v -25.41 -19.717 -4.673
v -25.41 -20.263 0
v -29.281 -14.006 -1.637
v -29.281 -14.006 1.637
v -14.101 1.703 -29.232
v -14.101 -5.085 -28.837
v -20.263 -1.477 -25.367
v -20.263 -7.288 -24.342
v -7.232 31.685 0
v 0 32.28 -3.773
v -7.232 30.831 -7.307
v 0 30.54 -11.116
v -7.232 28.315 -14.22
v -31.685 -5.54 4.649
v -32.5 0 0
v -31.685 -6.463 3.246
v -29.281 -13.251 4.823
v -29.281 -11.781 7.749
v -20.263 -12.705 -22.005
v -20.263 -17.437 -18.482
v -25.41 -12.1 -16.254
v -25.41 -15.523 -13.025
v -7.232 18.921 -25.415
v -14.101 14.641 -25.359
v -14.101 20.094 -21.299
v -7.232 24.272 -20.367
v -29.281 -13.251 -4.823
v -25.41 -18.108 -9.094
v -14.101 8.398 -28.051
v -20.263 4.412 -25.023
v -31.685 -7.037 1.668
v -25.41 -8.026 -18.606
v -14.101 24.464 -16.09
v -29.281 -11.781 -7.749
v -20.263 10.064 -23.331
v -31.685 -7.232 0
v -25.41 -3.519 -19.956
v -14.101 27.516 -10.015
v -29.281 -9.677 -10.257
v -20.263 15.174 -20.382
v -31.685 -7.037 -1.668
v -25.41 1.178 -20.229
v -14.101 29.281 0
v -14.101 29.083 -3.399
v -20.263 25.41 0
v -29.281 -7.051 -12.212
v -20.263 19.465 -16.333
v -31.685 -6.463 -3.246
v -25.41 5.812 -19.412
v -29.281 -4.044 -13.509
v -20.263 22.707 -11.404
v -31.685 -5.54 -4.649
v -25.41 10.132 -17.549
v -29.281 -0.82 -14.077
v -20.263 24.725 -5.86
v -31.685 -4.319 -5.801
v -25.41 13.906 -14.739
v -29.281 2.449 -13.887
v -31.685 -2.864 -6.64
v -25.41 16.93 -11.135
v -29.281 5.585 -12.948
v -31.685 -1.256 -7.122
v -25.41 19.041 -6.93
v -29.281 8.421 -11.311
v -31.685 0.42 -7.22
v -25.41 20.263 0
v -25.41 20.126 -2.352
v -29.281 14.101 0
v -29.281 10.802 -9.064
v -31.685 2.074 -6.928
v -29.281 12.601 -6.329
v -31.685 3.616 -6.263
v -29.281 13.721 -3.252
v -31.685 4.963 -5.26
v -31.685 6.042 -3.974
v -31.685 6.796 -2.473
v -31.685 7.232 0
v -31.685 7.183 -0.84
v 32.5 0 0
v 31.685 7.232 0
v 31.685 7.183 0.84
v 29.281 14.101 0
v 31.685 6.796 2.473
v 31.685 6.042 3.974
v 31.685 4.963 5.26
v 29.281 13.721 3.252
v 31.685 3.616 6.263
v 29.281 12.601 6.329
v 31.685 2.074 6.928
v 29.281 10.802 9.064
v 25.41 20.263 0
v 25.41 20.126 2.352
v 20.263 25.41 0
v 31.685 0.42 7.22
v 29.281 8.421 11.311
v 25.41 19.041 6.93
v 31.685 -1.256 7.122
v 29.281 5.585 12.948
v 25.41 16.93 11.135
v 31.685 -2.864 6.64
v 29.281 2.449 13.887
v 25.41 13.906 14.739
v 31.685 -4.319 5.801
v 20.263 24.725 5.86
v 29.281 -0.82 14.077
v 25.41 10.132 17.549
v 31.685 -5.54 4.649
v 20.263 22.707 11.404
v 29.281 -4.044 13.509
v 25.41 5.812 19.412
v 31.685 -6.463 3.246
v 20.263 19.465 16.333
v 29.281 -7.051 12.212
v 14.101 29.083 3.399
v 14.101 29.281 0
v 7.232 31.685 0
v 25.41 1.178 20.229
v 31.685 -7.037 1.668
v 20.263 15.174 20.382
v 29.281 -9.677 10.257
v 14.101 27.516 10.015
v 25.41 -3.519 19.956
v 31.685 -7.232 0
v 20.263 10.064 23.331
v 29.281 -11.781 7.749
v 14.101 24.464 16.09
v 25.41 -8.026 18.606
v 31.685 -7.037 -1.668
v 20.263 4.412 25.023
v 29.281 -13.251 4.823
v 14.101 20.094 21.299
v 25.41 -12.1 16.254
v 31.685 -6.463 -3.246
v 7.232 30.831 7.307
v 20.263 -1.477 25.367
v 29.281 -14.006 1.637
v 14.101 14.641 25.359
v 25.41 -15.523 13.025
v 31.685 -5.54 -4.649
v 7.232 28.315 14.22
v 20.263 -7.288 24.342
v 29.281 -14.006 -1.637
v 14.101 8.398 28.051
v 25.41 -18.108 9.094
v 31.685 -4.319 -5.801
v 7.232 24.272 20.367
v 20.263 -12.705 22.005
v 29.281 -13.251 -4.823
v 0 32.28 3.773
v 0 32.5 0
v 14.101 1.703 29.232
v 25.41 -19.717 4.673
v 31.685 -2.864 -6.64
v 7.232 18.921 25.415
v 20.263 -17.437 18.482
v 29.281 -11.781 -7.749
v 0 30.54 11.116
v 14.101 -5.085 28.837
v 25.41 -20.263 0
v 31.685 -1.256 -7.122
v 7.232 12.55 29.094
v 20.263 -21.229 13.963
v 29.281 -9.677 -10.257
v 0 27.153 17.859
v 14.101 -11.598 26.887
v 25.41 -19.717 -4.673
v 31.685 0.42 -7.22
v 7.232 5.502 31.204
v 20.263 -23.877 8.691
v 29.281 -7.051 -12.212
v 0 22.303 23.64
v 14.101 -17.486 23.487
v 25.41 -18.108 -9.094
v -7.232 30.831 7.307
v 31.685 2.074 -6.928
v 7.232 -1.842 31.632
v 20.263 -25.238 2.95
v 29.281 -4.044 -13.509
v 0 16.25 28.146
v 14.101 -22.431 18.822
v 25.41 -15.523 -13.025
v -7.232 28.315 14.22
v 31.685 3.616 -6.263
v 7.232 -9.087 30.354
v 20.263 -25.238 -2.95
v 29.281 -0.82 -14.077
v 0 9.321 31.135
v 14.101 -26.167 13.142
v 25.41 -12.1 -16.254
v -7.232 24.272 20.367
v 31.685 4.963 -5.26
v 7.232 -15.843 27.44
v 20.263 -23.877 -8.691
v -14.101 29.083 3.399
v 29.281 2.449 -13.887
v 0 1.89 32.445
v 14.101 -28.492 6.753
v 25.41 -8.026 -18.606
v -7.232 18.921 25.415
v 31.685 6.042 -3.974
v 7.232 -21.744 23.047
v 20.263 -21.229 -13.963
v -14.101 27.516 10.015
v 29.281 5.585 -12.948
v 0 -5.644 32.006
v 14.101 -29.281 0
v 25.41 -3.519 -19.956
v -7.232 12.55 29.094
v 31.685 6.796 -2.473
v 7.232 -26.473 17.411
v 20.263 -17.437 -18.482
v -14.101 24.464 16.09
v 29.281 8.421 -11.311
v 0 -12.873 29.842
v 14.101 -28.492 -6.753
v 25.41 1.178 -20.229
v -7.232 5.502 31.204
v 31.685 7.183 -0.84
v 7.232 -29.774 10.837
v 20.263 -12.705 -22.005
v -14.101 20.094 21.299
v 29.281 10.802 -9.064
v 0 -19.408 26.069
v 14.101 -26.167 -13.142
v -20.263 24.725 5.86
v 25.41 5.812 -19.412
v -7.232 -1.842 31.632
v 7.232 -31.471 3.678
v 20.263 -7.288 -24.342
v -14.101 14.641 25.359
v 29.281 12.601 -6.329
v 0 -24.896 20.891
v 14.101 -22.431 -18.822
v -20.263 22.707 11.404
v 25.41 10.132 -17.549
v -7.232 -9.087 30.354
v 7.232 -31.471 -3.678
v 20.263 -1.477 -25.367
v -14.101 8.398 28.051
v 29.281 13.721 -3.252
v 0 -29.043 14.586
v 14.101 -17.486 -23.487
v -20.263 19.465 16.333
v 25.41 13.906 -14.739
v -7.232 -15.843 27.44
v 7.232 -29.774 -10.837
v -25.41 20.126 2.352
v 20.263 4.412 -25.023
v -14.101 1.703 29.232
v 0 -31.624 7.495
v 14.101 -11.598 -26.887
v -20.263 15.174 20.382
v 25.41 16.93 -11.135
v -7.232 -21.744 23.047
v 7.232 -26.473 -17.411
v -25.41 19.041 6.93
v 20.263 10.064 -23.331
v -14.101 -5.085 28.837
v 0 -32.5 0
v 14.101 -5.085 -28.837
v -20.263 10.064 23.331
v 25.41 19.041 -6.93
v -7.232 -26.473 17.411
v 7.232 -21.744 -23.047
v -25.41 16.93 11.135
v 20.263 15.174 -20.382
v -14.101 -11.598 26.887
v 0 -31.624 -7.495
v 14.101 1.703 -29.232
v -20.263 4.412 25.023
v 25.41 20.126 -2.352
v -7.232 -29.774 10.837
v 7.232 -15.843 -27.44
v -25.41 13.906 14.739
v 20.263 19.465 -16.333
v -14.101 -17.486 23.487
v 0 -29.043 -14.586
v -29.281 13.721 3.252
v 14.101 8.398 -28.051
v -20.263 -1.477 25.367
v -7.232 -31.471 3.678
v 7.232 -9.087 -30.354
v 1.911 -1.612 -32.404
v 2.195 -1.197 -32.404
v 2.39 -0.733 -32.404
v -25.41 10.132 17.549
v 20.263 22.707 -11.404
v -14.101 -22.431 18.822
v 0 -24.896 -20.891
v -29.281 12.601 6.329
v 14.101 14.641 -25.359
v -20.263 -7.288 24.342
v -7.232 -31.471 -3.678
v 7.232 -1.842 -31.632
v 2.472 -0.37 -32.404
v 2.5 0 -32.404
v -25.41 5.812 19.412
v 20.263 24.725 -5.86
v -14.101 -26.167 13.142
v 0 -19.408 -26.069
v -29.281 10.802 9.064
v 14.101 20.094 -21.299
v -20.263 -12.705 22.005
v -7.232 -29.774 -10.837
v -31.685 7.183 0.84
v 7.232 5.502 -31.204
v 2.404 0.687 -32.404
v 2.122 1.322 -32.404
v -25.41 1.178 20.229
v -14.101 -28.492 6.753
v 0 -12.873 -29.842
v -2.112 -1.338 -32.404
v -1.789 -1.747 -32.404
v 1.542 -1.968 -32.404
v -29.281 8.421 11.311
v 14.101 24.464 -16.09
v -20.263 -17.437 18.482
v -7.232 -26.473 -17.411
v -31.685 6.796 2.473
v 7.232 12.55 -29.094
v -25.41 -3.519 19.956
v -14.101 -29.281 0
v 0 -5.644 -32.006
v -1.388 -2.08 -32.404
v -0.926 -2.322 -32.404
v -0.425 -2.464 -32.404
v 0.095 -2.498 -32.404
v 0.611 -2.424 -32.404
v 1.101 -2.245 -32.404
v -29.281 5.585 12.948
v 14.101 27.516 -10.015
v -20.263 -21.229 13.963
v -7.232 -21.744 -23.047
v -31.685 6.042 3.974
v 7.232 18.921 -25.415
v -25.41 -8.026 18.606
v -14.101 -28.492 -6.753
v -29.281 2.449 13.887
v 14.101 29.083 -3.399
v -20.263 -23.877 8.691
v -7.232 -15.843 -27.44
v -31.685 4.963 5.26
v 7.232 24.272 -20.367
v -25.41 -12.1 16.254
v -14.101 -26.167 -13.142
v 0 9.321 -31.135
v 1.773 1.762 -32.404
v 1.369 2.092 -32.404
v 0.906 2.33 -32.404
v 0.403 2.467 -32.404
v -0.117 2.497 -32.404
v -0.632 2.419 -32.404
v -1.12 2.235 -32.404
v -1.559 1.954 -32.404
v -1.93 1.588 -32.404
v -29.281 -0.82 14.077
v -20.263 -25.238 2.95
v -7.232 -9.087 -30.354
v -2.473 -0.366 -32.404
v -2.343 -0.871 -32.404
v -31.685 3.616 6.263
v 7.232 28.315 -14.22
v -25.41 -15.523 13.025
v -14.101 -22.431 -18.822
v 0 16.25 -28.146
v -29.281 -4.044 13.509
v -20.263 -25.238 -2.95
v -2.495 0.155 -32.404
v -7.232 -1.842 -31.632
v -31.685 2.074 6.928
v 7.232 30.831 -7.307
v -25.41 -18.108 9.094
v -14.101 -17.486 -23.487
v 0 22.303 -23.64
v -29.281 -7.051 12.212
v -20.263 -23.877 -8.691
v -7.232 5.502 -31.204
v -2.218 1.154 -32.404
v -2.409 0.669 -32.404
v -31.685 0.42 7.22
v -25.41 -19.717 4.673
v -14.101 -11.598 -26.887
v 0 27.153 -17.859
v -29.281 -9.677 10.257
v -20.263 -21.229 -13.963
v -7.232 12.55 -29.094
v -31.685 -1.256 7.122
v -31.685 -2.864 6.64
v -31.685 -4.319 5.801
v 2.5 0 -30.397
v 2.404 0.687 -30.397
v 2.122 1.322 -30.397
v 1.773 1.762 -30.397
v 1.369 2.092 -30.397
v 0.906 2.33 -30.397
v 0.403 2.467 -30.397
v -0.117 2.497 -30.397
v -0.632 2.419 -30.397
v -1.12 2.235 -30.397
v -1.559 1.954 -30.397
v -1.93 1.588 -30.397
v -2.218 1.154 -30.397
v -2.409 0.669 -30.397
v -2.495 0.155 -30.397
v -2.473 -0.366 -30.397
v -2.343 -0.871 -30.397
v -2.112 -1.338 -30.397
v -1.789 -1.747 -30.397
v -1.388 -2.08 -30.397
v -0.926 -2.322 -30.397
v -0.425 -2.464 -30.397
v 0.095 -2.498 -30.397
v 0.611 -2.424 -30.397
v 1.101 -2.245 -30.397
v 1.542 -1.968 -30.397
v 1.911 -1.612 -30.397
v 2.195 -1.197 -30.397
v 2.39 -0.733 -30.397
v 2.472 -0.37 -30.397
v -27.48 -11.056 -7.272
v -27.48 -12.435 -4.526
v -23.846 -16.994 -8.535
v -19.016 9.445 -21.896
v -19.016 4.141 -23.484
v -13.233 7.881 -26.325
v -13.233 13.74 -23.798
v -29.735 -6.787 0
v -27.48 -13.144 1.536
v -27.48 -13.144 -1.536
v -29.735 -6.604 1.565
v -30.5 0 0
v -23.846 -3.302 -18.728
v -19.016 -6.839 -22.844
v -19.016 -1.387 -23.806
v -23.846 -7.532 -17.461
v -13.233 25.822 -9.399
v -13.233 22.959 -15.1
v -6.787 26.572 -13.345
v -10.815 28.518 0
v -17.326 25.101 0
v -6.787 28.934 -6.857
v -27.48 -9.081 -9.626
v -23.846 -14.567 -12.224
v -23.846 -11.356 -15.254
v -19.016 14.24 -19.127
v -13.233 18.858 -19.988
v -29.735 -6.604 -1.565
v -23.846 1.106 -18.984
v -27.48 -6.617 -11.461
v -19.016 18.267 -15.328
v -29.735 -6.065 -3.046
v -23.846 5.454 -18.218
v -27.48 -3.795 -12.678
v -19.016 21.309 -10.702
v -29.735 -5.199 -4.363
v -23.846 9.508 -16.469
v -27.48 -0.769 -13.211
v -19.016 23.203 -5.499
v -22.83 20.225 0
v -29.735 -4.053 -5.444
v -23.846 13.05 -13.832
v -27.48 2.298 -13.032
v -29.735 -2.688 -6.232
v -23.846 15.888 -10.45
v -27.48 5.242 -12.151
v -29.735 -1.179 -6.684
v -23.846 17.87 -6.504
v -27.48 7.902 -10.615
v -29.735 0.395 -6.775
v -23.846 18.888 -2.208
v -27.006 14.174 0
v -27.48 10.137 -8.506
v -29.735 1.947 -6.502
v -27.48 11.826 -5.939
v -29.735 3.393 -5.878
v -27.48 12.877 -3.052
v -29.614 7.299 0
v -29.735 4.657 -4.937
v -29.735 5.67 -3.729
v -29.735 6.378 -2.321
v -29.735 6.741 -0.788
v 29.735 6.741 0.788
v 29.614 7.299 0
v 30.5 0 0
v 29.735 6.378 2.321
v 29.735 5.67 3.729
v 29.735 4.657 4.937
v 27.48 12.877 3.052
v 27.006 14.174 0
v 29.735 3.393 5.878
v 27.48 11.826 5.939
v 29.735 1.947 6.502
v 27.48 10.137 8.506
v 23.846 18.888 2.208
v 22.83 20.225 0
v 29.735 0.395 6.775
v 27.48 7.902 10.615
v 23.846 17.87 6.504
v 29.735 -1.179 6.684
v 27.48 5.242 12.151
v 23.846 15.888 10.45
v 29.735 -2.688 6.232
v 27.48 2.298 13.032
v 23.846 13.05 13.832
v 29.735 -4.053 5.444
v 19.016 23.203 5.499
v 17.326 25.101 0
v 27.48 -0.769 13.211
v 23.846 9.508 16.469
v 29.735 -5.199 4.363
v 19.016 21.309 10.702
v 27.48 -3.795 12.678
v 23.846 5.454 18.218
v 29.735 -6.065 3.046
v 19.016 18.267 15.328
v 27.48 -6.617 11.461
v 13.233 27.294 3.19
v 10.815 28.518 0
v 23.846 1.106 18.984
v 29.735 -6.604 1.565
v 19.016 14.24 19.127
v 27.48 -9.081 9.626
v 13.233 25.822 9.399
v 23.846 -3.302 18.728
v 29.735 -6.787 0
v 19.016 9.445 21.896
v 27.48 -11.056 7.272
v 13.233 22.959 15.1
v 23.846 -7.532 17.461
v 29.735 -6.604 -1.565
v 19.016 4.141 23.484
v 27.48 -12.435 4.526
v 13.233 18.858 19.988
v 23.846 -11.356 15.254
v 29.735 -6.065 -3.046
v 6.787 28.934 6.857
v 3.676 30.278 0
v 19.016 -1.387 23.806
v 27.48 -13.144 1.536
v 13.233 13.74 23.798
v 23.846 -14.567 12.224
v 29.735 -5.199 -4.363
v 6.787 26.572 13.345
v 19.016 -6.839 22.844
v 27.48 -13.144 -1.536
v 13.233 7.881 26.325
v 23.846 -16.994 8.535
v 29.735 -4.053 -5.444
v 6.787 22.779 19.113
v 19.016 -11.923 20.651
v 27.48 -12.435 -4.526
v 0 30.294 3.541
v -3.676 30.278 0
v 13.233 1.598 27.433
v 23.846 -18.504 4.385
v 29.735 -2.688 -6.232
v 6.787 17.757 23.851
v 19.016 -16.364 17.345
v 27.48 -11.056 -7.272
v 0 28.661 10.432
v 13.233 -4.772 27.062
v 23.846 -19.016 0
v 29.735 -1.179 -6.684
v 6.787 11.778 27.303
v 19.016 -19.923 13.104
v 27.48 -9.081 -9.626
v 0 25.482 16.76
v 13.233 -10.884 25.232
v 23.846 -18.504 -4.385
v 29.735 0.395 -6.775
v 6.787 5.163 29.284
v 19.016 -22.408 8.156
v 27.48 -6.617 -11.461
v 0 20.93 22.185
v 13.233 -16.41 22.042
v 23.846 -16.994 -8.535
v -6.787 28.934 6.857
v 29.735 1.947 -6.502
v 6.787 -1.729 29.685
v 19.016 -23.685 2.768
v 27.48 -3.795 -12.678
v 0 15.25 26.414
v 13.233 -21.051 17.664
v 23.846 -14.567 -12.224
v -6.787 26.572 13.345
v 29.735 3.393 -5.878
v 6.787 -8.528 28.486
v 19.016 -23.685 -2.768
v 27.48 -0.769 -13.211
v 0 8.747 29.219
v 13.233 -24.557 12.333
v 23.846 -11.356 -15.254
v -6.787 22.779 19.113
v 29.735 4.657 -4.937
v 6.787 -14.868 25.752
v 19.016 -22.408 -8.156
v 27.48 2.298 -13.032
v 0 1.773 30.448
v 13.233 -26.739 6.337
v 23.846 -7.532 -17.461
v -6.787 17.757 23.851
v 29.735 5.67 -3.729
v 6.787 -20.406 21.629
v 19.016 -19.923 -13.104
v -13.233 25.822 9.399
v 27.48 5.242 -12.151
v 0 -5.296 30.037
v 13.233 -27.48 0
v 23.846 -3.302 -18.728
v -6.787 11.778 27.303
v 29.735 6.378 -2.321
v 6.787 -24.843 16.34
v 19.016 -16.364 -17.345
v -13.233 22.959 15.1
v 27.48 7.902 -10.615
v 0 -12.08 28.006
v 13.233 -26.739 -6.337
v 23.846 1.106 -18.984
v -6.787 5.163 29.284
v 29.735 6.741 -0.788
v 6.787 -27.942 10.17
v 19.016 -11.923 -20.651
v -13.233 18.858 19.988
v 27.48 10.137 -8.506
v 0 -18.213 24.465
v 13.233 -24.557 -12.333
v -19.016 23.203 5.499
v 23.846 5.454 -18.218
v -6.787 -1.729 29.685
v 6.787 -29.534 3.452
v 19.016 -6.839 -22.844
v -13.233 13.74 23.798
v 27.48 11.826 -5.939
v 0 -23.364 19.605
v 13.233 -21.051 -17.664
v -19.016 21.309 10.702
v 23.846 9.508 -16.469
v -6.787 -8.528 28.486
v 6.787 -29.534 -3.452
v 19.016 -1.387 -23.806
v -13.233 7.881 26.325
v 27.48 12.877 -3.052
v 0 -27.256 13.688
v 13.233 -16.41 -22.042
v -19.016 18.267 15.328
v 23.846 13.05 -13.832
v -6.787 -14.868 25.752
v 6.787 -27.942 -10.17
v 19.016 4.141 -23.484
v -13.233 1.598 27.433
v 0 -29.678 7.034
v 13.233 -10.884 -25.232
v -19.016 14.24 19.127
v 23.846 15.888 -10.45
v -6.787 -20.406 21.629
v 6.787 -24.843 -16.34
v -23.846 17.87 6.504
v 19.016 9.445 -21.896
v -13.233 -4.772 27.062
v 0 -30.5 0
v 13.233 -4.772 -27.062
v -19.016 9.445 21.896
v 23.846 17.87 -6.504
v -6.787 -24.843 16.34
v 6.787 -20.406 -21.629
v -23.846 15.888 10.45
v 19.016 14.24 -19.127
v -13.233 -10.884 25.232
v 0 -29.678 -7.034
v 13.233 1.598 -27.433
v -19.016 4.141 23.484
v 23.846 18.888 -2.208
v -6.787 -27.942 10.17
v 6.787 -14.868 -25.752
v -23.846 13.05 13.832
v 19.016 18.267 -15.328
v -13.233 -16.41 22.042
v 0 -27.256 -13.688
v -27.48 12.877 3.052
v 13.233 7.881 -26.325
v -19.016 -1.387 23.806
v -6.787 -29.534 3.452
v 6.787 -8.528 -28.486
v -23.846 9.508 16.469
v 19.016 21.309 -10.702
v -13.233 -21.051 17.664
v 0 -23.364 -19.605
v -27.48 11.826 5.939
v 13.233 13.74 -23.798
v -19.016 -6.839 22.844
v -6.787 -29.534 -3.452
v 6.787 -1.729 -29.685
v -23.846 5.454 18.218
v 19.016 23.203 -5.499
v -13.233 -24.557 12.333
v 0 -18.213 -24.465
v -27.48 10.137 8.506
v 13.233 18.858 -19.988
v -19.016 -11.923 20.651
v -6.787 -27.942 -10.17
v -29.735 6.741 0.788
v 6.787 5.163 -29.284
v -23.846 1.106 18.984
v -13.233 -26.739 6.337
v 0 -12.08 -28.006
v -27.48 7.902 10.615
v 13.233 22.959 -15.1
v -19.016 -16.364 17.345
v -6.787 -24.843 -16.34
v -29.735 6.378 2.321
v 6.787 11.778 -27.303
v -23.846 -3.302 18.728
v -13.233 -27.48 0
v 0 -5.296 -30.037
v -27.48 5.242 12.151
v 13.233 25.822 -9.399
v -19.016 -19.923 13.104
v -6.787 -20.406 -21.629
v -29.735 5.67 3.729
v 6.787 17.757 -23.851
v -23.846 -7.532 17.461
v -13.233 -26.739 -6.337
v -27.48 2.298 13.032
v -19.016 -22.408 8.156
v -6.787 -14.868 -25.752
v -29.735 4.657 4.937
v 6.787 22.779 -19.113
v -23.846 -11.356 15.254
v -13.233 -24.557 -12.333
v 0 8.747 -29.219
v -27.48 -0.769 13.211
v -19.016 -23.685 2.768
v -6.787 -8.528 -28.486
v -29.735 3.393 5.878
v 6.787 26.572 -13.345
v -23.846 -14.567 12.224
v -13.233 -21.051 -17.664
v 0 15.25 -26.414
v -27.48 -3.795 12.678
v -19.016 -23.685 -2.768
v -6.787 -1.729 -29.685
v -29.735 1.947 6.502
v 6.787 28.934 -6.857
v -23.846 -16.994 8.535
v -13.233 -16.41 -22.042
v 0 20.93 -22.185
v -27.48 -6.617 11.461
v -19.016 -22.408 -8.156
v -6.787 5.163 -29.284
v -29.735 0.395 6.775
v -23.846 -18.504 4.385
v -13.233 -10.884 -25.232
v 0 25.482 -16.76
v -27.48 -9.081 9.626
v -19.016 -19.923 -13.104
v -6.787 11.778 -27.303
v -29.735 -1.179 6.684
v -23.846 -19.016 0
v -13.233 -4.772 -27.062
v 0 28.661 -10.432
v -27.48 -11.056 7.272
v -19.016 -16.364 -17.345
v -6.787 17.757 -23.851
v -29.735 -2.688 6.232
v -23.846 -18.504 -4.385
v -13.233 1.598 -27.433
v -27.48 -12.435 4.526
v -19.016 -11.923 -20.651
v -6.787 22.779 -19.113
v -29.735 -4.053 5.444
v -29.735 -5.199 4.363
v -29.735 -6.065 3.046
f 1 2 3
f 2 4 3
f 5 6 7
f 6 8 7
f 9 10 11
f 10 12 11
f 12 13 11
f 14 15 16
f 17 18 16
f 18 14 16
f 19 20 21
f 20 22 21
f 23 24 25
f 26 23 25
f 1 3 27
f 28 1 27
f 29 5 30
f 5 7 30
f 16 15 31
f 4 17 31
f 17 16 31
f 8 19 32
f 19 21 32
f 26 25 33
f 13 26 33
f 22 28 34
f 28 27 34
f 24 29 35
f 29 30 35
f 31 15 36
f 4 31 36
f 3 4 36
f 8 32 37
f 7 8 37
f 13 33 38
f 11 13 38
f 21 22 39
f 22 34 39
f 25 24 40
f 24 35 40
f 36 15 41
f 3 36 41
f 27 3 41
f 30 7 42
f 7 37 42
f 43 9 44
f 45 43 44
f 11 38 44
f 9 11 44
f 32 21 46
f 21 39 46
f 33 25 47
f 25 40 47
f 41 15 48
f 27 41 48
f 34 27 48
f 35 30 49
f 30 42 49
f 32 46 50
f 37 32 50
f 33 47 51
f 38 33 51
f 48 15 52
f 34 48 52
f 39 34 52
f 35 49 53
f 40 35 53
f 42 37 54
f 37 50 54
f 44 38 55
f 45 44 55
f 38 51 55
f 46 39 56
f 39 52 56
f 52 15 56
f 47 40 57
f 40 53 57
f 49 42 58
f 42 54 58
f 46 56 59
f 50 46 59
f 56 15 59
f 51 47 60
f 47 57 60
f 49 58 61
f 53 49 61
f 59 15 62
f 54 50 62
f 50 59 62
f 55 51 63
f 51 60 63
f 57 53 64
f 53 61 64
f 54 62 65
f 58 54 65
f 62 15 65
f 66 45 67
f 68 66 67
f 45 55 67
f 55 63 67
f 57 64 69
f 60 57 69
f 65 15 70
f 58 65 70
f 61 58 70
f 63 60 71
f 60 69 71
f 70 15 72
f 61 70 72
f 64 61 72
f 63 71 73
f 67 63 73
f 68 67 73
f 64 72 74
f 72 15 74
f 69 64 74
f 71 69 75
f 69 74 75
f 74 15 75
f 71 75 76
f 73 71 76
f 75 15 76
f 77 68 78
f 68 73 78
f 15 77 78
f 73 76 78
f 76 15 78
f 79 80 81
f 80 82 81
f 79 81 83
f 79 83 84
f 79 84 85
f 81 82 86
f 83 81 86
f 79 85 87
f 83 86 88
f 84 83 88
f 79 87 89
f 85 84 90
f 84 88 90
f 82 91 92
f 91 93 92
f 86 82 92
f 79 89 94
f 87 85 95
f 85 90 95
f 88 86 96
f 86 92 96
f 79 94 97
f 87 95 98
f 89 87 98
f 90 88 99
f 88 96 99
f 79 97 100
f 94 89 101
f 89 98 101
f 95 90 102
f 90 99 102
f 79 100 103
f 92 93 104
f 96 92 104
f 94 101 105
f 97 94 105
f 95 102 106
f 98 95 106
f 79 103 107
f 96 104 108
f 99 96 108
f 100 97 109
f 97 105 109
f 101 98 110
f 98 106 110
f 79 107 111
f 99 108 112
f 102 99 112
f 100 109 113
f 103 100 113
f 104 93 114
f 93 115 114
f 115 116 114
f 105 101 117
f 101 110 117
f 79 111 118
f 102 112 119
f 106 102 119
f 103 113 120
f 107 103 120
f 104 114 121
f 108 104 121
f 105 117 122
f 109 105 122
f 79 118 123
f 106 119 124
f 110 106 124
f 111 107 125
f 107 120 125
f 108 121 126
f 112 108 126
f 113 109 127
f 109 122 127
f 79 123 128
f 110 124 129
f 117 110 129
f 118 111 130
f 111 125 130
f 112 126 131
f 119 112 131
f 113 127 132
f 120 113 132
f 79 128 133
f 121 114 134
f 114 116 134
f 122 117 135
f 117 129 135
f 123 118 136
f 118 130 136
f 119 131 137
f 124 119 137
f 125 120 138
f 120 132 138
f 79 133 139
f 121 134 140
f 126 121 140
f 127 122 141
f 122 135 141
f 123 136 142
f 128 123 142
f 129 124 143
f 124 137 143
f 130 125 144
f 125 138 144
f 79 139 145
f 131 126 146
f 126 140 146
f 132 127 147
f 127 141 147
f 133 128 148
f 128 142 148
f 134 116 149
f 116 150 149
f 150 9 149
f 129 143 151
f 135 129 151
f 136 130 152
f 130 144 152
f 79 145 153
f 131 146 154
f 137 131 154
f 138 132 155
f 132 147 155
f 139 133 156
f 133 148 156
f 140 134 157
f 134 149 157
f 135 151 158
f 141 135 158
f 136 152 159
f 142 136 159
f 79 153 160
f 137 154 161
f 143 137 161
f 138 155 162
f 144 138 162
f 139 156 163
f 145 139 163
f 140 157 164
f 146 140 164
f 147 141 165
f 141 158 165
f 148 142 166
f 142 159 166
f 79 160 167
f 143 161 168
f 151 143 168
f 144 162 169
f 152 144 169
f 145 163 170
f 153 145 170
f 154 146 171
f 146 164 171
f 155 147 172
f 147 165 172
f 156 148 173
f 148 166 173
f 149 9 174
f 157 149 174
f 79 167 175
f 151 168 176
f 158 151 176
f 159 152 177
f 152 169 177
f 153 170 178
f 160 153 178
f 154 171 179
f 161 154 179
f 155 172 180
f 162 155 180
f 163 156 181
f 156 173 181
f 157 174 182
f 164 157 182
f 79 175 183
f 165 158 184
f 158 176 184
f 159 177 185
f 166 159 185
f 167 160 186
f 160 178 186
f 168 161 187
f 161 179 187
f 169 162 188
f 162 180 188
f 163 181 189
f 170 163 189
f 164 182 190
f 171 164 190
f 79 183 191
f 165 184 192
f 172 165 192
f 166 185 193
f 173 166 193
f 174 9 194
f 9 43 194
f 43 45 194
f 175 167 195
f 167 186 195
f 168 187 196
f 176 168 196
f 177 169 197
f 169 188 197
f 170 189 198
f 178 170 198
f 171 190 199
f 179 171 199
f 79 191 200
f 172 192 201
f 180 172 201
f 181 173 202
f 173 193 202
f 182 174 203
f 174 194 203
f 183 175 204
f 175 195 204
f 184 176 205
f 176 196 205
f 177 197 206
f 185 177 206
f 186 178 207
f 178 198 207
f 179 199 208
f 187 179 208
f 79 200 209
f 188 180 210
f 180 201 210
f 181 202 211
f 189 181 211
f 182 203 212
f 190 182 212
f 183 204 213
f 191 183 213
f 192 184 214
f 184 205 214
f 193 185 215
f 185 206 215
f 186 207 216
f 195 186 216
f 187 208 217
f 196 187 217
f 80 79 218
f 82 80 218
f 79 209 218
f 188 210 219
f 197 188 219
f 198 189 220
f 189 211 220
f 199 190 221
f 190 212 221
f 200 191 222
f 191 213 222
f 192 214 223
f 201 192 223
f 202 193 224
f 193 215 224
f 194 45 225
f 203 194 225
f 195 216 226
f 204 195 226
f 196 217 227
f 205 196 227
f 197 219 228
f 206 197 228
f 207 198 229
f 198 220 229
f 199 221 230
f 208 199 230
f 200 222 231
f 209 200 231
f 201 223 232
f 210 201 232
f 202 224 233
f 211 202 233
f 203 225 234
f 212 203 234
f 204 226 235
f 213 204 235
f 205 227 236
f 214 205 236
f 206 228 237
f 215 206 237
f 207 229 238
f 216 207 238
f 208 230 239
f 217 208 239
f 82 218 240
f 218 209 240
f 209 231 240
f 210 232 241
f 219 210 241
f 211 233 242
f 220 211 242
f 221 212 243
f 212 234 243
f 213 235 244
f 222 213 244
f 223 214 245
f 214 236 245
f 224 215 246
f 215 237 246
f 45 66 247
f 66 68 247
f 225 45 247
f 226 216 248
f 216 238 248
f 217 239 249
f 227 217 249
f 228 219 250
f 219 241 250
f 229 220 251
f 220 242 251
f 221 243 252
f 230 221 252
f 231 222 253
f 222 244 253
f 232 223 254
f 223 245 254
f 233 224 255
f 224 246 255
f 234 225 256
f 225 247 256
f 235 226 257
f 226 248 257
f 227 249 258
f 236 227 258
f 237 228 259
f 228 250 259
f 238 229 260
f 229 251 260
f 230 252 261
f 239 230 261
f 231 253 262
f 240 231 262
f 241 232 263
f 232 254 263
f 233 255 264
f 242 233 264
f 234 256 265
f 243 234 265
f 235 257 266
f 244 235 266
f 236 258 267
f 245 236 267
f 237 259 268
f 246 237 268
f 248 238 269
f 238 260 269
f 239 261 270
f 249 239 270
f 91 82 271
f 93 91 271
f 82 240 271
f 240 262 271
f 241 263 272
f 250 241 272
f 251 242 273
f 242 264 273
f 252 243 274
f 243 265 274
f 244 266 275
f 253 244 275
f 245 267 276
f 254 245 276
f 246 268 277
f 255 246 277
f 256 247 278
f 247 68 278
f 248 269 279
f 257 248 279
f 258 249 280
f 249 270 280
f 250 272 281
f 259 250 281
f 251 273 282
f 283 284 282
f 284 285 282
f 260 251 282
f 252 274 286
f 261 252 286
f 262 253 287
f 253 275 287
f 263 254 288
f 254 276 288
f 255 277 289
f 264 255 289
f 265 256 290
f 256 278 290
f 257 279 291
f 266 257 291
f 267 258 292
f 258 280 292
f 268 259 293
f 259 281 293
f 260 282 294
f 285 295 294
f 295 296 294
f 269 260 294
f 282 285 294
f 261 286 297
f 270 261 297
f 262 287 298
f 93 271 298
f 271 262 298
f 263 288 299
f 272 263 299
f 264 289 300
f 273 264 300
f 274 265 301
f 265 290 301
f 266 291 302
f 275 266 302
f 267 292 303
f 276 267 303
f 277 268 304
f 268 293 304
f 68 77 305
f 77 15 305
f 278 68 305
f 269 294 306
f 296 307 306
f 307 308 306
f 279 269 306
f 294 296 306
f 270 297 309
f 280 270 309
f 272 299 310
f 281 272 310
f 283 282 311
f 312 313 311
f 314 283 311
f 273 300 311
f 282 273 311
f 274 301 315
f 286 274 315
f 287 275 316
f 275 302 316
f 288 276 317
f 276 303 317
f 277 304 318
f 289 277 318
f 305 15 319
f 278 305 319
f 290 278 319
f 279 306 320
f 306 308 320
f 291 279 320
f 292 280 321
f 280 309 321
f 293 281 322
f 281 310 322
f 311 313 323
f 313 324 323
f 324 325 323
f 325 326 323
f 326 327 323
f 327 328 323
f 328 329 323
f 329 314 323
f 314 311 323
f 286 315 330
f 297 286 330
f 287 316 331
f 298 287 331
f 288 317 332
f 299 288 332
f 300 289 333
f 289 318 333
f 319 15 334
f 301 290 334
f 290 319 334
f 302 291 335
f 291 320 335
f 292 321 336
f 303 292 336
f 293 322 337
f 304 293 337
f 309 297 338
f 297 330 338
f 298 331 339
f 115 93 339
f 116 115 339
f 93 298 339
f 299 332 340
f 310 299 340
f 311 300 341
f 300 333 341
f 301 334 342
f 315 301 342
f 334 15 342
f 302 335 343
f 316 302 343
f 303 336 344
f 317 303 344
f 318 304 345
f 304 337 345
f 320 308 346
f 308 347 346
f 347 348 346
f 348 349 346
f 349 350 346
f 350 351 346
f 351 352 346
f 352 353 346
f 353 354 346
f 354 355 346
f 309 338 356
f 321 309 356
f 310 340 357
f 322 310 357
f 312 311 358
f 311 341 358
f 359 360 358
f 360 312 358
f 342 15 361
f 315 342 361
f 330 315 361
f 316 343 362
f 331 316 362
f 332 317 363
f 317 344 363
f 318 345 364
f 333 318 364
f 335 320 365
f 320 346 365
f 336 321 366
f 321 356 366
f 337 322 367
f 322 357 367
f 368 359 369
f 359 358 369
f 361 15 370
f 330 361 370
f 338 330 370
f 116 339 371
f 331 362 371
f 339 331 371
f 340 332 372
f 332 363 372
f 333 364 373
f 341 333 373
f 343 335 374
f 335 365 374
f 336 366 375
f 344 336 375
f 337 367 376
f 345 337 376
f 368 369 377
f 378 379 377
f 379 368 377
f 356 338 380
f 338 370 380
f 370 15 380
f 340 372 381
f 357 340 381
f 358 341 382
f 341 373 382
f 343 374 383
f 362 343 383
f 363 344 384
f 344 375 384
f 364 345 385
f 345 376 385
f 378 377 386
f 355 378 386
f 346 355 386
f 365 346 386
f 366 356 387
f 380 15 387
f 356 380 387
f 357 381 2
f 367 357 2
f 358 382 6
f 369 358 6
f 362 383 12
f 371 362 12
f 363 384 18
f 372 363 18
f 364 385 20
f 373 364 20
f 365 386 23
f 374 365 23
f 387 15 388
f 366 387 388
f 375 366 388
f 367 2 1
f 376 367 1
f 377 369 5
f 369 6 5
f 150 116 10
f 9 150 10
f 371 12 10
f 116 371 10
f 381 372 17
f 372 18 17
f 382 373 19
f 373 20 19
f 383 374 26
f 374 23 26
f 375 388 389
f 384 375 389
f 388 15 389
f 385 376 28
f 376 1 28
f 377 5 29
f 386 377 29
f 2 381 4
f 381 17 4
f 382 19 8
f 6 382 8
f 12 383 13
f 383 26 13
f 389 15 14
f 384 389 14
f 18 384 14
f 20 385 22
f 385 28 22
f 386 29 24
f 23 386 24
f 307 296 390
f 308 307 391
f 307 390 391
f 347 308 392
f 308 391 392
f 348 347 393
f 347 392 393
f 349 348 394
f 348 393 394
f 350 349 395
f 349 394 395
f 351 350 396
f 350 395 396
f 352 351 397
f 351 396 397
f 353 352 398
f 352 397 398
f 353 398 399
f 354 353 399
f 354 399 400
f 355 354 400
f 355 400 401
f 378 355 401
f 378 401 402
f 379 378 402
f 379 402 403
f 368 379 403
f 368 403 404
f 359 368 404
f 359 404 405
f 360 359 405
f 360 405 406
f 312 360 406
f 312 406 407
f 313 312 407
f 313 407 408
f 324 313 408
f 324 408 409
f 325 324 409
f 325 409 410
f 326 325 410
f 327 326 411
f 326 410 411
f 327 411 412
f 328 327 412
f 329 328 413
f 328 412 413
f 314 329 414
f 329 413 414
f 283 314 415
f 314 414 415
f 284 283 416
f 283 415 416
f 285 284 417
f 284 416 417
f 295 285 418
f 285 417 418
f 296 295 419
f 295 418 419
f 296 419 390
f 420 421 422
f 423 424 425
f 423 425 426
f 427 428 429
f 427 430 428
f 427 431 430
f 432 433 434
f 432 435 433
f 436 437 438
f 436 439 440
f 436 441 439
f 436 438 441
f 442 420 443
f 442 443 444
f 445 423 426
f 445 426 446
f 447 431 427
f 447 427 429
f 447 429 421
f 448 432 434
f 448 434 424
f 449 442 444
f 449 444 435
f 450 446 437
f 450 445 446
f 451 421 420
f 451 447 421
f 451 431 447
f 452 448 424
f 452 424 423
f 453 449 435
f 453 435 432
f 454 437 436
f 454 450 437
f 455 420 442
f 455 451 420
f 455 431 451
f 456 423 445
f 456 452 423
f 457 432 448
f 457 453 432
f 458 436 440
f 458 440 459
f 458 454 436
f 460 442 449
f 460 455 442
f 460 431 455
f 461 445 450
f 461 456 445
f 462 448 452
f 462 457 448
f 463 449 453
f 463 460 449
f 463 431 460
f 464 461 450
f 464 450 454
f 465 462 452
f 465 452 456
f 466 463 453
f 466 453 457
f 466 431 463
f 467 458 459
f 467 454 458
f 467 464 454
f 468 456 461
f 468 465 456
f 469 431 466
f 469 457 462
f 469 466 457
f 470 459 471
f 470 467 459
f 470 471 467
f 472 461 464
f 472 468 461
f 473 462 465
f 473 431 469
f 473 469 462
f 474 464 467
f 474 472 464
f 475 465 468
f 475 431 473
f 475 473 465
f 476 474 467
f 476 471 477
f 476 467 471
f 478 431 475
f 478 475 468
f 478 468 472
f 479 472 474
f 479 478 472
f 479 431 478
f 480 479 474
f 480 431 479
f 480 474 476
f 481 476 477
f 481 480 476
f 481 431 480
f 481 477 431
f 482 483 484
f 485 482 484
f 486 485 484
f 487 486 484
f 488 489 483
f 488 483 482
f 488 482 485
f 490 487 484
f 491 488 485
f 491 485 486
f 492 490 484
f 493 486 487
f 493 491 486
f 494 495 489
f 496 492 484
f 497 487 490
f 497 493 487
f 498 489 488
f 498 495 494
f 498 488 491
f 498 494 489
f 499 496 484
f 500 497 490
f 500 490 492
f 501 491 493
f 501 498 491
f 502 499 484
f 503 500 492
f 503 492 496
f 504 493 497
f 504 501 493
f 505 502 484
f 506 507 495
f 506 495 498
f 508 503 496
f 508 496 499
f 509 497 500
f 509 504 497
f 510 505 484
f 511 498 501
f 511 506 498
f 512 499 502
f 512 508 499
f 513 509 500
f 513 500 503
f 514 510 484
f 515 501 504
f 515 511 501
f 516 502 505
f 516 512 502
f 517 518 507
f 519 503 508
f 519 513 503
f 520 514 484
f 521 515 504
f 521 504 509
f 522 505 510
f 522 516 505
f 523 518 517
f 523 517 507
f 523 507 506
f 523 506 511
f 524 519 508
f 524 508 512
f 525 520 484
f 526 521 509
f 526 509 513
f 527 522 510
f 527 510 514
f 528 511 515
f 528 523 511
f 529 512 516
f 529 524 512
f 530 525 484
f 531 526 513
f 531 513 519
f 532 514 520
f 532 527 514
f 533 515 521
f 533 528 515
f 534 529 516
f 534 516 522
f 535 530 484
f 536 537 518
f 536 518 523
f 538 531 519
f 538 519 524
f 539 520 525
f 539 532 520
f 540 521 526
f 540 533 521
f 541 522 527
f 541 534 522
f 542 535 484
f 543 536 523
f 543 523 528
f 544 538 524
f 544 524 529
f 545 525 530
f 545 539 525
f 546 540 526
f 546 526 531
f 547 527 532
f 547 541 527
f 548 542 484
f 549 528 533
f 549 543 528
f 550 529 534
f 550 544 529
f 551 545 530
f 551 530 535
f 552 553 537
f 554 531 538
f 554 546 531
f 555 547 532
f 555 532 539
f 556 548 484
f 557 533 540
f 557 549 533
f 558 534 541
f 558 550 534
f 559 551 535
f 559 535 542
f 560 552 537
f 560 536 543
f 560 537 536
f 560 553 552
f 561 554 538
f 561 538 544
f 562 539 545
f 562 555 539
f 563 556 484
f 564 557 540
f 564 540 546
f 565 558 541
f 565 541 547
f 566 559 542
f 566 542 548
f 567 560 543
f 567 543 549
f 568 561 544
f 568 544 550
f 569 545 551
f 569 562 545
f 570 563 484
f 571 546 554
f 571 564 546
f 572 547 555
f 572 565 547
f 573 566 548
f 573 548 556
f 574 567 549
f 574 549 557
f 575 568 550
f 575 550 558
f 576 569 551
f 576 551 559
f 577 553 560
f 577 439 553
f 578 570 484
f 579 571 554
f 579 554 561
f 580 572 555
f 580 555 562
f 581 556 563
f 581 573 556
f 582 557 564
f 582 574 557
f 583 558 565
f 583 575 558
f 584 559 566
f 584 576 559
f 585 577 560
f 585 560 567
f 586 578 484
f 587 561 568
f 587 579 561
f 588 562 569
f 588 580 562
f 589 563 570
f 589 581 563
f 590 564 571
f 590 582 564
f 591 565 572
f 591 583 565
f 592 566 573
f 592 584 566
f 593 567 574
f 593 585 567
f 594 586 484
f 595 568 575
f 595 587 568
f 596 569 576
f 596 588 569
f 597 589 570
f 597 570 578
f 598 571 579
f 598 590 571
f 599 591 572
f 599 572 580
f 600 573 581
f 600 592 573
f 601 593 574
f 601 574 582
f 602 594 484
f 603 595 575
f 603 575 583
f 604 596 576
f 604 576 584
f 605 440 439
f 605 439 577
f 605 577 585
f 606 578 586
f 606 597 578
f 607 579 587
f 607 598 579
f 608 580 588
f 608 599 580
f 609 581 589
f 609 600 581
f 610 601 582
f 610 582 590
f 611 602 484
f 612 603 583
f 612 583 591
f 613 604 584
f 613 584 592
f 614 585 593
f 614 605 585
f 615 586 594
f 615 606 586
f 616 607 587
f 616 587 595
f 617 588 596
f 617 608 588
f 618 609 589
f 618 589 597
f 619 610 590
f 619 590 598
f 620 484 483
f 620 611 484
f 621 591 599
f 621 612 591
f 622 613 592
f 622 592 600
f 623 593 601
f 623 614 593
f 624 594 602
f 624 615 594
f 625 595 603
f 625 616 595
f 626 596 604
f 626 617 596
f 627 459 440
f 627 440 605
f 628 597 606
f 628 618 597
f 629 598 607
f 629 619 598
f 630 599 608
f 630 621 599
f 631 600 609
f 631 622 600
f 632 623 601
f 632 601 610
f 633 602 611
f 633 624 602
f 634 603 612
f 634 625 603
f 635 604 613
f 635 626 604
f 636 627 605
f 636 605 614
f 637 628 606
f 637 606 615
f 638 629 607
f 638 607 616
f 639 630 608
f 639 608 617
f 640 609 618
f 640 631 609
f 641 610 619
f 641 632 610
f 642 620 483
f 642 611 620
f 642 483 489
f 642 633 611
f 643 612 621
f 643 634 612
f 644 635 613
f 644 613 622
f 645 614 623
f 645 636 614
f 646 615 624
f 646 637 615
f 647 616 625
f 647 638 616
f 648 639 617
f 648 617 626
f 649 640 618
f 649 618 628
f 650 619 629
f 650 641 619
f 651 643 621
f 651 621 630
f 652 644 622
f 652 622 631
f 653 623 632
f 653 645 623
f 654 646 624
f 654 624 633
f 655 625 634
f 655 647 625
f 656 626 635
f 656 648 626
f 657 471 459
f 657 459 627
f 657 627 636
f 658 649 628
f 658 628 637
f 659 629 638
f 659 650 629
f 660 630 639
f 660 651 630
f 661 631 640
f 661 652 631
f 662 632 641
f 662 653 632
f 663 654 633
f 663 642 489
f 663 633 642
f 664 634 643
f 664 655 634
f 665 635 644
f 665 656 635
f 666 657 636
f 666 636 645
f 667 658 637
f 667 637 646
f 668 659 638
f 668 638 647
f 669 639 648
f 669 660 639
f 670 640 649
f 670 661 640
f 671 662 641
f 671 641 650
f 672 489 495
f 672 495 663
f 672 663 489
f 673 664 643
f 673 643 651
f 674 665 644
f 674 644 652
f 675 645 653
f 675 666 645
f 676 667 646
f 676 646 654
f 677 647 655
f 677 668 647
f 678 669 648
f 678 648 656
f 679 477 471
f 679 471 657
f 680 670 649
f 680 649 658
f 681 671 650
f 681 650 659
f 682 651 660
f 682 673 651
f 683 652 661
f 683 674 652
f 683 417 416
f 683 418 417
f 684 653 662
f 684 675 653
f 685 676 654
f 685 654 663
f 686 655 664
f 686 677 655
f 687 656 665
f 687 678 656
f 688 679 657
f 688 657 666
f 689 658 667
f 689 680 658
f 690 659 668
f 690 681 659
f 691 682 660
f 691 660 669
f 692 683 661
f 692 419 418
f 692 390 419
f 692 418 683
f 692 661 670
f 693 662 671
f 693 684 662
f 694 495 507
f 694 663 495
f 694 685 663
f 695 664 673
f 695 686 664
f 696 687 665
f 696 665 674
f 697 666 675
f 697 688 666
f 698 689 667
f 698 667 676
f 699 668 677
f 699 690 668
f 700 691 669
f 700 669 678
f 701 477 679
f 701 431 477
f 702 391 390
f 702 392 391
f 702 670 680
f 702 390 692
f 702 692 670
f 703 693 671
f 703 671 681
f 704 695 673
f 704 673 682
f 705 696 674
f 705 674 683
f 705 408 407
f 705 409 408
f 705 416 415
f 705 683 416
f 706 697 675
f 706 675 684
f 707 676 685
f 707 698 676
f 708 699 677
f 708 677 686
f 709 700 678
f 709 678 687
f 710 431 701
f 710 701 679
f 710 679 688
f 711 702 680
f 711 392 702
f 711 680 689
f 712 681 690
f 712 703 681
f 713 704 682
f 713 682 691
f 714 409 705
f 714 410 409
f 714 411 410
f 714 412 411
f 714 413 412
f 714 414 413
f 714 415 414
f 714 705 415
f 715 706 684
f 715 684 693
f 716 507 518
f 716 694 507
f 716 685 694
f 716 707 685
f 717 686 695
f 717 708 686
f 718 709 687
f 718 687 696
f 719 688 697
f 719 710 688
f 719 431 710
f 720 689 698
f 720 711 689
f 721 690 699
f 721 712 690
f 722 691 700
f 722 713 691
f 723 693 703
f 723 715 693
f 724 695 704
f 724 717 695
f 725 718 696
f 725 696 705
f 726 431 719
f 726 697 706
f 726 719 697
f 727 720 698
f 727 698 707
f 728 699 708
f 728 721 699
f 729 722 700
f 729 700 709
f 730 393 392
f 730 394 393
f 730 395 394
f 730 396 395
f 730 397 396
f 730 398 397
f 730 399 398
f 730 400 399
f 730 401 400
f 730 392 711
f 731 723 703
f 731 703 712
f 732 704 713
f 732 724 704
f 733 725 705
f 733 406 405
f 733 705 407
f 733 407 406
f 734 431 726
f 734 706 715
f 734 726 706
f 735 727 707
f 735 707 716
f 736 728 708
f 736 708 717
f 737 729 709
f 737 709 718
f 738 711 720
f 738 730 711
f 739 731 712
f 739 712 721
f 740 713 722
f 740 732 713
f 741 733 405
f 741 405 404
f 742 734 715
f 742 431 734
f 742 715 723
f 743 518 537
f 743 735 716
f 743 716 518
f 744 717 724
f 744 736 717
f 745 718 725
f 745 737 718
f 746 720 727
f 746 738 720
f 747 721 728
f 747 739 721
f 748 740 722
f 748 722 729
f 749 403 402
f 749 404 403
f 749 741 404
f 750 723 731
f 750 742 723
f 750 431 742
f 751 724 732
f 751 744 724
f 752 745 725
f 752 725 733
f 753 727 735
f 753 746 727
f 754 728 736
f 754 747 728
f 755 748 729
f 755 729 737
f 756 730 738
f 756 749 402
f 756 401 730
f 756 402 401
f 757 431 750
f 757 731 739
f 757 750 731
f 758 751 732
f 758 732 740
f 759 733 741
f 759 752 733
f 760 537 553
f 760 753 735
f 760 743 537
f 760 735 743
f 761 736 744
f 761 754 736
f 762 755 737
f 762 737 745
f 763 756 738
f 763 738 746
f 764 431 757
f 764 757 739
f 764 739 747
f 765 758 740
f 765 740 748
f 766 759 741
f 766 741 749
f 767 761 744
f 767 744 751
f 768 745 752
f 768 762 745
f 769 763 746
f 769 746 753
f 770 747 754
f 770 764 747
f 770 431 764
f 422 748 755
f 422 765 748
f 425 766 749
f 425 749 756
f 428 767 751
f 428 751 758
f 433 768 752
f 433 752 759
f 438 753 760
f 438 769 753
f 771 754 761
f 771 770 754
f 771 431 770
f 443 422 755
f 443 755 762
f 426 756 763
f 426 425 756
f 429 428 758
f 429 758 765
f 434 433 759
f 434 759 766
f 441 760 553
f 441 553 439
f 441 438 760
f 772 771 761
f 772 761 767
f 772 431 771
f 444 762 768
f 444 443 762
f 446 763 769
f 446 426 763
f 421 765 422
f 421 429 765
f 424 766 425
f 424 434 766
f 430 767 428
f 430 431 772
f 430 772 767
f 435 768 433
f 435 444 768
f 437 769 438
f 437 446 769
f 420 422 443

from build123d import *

# Parameters (mm, degrees)
F2_T     = -2
F3_R     = 2.5
F4_DEPTH = 32.501


with BuildPart() as f1:
    # F0 (on Top) → F1 (revolve)
    with BuildSketch(Plane.XY):
        with BuildLine():
            ThreePointArc((32.5, 0), (0, 32.5), (-32.5, 0))
            Line((-32.5, 0), (32.5, 0))
        make_face()
    revolve(axis=Axis((0, 0, 0), (1, 0, 0)))

    # F2 (hollow: no face is removed)
    offset(amount=F2_T, mode=Mode.SUBTRACT)

    # F3 (on Top) → F4 (cut, through all)
    with BuildSketch(Plane.XY):
        Circle(F3_R)
    extrude(amount=-F4_DEPTH, mode=Mode.SUBTRACT)


solid = f1.part
